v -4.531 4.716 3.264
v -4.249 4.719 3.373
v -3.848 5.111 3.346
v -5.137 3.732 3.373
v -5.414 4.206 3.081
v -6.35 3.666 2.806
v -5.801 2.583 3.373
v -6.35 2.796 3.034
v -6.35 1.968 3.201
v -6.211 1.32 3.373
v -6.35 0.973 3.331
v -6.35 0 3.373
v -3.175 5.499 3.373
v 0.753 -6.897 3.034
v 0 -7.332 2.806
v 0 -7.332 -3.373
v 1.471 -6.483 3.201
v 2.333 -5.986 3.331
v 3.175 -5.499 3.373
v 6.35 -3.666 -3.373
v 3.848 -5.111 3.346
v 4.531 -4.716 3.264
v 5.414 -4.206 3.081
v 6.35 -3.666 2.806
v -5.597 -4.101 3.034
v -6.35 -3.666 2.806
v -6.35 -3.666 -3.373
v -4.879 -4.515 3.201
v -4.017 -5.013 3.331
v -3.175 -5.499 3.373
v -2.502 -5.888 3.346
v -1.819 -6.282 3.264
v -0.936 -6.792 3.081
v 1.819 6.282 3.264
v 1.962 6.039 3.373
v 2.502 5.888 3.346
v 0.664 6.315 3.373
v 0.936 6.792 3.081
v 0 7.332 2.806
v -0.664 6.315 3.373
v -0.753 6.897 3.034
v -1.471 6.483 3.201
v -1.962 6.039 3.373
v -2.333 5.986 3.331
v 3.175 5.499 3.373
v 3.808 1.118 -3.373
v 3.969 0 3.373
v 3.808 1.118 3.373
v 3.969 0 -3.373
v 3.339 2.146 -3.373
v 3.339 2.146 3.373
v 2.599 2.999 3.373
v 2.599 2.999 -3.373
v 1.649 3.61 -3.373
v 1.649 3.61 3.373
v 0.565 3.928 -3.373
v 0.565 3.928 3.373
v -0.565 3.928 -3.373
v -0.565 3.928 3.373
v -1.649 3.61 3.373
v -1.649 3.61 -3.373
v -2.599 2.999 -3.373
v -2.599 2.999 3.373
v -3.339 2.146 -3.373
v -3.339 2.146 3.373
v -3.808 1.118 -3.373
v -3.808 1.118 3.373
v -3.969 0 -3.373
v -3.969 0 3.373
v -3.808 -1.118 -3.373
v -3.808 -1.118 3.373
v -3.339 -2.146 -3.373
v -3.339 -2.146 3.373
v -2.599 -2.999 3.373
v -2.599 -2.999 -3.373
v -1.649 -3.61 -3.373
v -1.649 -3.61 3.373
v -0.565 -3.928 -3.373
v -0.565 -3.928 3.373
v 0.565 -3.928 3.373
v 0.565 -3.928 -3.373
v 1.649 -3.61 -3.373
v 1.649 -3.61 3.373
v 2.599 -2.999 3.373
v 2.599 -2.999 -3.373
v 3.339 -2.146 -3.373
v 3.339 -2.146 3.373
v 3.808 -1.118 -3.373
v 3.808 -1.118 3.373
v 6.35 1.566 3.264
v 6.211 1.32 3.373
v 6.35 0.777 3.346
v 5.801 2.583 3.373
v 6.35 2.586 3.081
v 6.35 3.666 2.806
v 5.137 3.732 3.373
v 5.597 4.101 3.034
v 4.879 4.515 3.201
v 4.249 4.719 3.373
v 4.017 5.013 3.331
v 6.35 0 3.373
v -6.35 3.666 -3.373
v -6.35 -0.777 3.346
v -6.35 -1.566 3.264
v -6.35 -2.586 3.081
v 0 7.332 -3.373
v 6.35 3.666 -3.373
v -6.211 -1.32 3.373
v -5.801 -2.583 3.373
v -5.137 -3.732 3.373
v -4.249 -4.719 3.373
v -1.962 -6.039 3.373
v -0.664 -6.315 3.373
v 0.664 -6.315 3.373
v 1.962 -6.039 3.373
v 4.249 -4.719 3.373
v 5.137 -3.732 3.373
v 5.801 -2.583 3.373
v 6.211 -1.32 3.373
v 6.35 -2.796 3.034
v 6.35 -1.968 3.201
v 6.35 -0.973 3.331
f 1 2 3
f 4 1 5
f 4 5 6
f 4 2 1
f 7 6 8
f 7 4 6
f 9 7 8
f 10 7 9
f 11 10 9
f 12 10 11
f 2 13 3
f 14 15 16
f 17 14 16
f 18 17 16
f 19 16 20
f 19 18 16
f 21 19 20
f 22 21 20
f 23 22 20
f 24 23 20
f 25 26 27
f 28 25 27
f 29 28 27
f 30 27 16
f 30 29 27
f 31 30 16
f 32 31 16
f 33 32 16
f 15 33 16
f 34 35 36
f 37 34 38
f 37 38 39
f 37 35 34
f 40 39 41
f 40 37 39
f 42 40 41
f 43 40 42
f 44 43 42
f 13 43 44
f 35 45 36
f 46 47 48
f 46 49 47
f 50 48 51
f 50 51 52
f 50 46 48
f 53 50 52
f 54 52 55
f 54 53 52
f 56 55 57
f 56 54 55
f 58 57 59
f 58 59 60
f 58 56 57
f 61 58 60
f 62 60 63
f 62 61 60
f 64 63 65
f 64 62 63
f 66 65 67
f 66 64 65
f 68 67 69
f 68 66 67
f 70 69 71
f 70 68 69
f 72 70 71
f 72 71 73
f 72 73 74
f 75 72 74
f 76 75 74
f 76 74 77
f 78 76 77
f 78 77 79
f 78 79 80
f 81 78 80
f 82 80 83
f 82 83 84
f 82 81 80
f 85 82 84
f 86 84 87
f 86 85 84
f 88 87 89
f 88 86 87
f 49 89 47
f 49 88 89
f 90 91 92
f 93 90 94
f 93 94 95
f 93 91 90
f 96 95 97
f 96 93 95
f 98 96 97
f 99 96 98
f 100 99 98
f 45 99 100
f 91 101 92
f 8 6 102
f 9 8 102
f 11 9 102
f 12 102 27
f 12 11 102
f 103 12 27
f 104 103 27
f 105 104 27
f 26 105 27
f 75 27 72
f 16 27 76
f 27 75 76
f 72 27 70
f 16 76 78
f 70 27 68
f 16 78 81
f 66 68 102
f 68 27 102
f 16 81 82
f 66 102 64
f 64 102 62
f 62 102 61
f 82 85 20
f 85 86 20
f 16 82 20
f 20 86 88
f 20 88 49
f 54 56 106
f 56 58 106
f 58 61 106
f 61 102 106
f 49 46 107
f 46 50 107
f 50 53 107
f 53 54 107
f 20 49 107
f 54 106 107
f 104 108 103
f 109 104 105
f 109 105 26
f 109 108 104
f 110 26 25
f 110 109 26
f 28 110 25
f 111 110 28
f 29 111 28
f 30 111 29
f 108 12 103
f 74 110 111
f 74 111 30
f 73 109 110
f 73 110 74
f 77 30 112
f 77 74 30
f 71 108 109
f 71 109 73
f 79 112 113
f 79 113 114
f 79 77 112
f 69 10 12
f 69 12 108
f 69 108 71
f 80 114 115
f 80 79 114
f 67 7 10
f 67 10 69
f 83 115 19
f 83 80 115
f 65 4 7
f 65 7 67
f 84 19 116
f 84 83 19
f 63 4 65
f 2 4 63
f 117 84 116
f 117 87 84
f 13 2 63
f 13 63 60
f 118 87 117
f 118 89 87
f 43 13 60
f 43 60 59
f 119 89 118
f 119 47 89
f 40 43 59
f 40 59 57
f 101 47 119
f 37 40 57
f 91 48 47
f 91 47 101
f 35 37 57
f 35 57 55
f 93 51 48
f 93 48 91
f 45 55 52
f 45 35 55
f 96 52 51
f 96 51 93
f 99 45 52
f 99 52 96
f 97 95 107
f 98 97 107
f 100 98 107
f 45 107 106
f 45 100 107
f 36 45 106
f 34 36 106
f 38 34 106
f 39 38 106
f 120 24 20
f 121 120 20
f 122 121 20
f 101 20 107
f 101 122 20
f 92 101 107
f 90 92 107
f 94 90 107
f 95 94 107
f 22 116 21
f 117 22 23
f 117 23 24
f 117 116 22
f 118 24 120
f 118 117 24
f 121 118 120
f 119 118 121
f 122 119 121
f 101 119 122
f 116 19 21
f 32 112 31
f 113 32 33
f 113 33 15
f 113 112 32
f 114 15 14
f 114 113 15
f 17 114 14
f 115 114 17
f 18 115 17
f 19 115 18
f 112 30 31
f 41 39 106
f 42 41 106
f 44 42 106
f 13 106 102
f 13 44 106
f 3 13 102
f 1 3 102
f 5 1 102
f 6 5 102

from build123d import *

# Parameters (mm, degrees)
SKETCH1_R         = 3.96875
EXTRUDE1_DEPTH    = 3.3734375
SKETCH7_OUTSIDE_W = 106.796
SKETCH7_OUTSIDE_H = 108.76
SKETCH7_OUTSIDE_R = 6.35
EXTRUDE2_DEPTH    = 25.4
EXTRUDE2_DRAFT    = -60


with BuildPart() as part:
    # Sketch1 → Extrude1 (new, symmetric)
    with BuildSketch(Plane.XY):
        Polygon((-6.35, 3.666174209), (-6.35, -3.666174209), (0, -7.332348419), (6.35, -3.666174209), (6.35, 3.666174209), (0, 7.332348419), align=None)
        Circle(SKETCH1_R, mode=Mode.SUBTRACT)
    extrude(amount=EXTRUDE1_DEPTH, both=True)


with BuildPart() as extrude2_tool:
    # Sketch7 outside → Extrude2 (with draft: the straight prism first)
    with BuildSketch(Plane.XY.offset(3.3734375)):
        Rectangle(SKETCH7_OUTSIDE_W, SKETCH7_OUTSIDE_H)
        Circle(SKETCH7_OUTSIDE_R, mode=Mode.SUBTRACT)
    extrude(amount=-EXTRUDE2_DEPTH)
    # Extrude2: the draft: its side faces are tilted about the plane it starts from
    extrude2_sides = [extrude2_tool.faces().sort_by_distance(p)[0] for p in [
        (0, -54.38, -9.3265625),
        (53.398, 0, -9.3265625),
        (0, 54.38, -9.3265625),
        (-53.398, 0, -9.3265625),
        (-6.35, 0, -9.3265625),
    ]]
    draft(extrude2_sides, Plane.XY.offset(3.3734375), EXTRUDE2_DRAFT)


with BuildPart() as part_1:
    add(part.part)

    # Extrude2: cut by extrude2_tool
    add(extrude2_tool.part, mode=Mode.SUBTRACT)


solid = part_1.part
